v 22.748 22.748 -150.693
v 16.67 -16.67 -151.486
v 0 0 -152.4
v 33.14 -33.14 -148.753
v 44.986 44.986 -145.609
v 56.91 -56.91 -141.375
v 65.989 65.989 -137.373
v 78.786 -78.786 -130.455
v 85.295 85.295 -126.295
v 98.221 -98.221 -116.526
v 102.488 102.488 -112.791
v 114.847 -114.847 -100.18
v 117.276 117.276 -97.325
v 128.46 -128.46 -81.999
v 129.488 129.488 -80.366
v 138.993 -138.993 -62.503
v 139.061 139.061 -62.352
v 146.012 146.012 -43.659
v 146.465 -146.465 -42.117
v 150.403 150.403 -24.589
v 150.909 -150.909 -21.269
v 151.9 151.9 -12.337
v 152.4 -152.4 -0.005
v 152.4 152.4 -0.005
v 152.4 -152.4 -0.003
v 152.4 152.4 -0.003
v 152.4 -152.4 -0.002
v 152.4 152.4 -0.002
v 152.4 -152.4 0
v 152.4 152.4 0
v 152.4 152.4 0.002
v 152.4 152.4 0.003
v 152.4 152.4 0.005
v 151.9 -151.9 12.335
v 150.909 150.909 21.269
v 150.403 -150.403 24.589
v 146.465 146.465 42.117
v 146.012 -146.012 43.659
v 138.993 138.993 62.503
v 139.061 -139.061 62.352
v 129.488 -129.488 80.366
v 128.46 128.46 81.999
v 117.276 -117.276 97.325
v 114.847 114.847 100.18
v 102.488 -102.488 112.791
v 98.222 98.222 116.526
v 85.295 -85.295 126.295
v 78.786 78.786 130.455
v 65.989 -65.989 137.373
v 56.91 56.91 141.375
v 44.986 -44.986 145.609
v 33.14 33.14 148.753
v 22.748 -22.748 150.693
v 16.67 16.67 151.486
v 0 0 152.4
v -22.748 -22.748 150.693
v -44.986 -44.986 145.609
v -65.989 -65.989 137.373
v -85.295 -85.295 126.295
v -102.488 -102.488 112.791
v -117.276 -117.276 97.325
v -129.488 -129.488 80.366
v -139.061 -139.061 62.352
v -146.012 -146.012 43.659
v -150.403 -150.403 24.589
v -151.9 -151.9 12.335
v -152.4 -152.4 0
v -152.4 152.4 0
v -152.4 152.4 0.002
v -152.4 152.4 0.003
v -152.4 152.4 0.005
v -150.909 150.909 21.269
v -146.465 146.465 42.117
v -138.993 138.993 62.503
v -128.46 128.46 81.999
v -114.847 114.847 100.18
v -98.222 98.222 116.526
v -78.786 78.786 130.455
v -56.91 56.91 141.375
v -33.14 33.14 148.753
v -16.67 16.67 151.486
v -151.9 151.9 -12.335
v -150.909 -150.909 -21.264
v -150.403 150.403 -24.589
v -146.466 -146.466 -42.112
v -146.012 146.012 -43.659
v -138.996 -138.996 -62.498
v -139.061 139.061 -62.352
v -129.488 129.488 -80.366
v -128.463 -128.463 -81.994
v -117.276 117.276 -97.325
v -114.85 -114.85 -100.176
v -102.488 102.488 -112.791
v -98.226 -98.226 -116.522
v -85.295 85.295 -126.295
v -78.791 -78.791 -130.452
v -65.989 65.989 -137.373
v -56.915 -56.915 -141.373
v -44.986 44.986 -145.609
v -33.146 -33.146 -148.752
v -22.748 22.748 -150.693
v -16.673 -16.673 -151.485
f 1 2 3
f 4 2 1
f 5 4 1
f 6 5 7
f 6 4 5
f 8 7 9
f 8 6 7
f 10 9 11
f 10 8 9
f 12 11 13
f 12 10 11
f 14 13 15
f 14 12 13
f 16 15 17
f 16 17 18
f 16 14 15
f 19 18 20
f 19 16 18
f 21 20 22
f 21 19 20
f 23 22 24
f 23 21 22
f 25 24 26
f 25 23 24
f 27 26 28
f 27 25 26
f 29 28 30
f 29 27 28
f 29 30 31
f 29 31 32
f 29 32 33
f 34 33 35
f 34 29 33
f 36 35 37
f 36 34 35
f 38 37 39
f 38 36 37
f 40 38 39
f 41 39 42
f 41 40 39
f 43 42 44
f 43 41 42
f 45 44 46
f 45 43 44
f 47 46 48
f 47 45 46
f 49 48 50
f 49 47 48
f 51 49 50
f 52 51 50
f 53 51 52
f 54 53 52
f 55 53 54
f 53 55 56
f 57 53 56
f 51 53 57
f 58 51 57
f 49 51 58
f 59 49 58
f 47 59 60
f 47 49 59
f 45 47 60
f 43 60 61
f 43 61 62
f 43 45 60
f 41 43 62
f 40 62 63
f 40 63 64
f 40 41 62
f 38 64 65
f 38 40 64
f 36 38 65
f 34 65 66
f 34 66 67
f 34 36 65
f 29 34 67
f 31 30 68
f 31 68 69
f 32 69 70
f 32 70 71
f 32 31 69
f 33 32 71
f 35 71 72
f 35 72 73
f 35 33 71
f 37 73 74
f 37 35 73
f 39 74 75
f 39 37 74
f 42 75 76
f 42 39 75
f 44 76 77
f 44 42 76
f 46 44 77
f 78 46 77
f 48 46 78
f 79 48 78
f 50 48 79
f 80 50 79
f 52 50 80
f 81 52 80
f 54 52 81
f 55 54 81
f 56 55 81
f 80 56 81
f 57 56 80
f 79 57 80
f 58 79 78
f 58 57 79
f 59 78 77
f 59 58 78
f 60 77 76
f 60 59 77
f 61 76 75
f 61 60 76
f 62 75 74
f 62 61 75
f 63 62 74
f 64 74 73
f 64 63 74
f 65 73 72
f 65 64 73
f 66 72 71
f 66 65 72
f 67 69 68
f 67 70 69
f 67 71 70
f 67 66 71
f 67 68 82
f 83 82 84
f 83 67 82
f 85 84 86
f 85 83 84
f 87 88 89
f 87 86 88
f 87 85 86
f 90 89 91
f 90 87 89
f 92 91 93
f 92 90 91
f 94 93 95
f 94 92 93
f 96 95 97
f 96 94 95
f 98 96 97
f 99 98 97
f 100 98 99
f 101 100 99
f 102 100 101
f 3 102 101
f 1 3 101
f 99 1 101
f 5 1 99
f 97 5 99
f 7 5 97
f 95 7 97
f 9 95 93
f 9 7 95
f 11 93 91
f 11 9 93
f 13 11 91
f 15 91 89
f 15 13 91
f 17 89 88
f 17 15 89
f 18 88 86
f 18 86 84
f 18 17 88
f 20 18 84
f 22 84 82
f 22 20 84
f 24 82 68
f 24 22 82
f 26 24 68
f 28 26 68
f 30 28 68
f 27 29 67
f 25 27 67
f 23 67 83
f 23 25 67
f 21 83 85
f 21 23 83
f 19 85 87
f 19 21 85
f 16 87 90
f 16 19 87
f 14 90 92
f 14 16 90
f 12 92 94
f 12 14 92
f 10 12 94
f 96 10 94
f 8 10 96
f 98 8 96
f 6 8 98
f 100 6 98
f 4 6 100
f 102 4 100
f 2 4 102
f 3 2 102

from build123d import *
from build123d import SkipClean  # not in build123d's __all__

# Parameters (mm, degrees)
F0_W     = 304.8
F0_H     = 304.8
F1_DEPTH = 152.4
F2_R     = 152.4
F4_DEPTH = 152.4
F3_R     = 152.4
F5_DEPTH = 152.4


with BuildPart() as f1:
    # F0 (on Top) → F1 (new body, symmetric)
    with BuildSketch(Plane.XY):
        Rectangle(F0_W, F0_H)
    extrude(amount=F1_DEPTH, both=True)

    # F2 (on Right) → F4 (intersect, symmetric)
    with BuildSketch(Plane.YZ):
        Circle(F2_R)
    extrude(amount=F4_DEPTH, both=True, mode=Mode.INTERSECT)

    # F3 (on Front) → F5 (intersect, symmetric)
    with BuildSketch(Plane.XZ):
        Circle(F3_R)
    with SkipClean():  # cleaning this boolean's faces spoils the solid; the shape is the same uncleaned
        extrude(amount=F5_DEPTH, both=True, mode=Mode.INTERSECT)


solid = f1.part
